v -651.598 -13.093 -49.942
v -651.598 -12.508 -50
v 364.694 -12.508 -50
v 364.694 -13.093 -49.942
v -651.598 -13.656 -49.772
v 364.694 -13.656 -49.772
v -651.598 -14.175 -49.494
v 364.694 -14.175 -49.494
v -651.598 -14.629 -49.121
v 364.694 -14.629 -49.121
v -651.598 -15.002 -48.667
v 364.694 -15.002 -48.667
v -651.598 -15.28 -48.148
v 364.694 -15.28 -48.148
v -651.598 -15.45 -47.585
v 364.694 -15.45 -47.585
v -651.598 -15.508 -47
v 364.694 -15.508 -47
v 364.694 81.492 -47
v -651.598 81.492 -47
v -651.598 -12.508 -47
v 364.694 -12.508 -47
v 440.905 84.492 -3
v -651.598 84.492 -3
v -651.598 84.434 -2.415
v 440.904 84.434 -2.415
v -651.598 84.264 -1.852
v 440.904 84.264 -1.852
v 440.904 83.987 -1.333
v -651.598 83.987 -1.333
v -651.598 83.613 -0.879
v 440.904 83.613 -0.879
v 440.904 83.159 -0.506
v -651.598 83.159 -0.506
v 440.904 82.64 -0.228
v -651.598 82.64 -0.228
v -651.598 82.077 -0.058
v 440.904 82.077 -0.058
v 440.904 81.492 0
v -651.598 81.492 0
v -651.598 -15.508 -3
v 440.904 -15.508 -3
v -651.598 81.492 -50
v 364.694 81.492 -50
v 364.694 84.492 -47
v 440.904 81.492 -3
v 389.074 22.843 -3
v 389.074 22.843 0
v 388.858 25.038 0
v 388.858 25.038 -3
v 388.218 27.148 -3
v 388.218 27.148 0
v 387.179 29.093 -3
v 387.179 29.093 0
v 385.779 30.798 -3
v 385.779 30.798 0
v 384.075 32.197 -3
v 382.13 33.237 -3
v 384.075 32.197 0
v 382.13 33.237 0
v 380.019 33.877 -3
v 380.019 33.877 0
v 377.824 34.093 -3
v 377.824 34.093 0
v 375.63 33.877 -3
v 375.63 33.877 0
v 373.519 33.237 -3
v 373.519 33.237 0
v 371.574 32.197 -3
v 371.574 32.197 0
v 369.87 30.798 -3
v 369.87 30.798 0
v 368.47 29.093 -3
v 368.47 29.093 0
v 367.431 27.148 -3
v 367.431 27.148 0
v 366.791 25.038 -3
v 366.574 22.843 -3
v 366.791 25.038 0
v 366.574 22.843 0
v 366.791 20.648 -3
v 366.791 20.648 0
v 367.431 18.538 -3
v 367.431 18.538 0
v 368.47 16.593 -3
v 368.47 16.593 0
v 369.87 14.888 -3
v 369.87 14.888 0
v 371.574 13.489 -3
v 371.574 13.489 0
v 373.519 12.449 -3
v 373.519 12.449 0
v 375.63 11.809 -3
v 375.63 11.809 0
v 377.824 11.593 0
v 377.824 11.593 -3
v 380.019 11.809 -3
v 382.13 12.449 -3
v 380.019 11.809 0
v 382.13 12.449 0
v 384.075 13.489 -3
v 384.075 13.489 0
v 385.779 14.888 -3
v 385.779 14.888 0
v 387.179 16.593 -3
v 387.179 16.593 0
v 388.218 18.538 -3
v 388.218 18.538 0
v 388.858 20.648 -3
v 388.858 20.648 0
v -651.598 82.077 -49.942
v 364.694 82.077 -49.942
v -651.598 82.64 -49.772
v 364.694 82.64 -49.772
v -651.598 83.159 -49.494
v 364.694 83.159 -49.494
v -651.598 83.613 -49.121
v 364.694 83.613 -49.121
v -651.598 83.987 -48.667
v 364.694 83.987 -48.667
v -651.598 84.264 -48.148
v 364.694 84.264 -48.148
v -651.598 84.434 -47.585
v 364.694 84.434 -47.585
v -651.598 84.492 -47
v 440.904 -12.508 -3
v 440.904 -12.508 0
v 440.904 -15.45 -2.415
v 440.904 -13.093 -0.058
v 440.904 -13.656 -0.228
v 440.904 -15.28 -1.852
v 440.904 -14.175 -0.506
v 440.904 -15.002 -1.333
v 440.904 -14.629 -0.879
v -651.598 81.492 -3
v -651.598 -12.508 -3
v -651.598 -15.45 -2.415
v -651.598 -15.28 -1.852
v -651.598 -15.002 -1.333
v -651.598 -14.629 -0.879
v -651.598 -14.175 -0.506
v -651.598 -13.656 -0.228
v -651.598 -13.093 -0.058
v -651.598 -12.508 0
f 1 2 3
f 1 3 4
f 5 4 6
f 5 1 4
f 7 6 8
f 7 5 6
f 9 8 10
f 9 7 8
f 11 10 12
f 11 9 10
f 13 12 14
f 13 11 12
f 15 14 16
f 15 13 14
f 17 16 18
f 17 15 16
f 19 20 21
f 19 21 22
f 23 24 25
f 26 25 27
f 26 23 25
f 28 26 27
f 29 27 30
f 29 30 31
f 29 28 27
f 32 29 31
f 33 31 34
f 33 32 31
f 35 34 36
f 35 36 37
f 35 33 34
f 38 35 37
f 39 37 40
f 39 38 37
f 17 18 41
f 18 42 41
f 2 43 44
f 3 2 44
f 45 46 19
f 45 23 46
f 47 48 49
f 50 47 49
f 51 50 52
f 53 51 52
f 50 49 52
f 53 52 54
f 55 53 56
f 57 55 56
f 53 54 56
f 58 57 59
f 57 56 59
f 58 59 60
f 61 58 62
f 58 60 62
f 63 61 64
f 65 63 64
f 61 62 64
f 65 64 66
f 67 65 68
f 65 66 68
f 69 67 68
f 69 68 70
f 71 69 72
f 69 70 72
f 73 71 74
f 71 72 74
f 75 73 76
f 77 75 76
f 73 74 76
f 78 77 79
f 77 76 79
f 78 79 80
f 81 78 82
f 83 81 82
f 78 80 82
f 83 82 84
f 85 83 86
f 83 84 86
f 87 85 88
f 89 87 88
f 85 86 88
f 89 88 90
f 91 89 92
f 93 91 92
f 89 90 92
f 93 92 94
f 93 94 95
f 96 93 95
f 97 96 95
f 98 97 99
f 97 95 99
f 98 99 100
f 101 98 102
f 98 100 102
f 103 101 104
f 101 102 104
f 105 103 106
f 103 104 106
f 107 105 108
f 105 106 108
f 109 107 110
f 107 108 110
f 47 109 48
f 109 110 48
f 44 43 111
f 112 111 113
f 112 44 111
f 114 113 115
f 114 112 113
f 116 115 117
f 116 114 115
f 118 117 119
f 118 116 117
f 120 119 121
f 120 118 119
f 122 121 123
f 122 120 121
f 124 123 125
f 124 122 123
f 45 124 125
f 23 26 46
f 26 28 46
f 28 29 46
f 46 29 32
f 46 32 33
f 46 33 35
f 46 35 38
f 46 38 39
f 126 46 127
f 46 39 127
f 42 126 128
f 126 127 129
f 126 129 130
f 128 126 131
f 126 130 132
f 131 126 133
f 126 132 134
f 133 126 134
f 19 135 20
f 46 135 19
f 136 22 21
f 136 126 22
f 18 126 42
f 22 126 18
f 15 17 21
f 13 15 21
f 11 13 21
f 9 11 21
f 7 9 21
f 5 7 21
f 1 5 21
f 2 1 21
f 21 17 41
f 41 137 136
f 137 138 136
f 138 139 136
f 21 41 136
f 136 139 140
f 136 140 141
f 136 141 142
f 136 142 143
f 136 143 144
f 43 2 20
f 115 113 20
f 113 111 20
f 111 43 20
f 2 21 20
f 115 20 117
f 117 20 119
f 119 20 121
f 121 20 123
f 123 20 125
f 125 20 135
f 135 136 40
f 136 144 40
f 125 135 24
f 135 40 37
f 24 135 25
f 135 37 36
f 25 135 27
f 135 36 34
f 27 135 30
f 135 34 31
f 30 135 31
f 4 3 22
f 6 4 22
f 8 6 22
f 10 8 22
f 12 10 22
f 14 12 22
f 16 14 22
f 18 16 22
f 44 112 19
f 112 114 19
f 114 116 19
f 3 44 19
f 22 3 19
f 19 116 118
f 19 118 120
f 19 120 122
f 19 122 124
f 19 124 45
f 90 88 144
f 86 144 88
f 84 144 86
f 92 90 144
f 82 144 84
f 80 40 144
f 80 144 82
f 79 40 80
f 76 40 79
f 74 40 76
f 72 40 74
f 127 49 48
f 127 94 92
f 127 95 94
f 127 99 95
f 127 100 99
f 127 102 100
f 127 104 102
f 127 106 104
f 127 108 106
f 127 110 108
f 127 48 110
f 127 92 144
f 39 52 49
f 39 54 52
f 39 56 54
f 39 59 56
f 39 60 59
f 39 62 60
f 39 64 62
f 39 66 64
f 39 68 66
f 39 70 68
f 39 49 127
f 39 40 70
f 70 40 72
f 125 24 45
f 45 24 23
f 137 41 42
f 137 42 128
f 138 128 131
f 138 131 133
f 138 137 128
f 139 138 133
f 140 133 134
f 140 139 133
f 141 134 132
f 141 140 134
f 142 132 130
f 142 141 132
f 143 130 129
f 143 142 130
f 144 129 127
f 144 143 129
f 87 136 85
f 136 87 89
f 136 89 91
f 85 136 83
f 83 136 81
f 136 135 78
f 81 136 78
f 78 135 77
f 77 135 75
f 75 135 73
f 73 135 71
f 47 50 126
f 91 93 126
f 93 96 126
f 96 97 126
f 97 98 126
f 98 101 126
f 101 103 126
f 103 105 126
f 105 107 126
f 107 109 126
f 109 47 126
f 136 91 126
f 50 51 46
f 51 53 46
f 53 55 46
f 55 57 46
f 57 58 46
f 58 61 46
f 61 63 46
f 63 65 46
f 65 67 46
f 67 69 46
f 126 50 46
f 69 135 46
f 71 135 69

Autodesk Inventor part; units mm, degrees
ref_plane "YZ Plane" through (0, 0, 0) normal (1, 0, 0) x (0, 1, 0)
ref_plane "XZ Plane" through (0, 0, 0) normal (0, 1, 0) x (-1, 0, 0)
ref_plane "XY Plane" through (0, 0, 0) normal (0, 0, 1) x (1, 0, 0)
sketch "Sketch1" plane through (0, 0, 0) normal (0, 0, 1) x (1, 0, 0)
  line L0 (-651.5983, 84.4921) -> (440.9045, 84.4921)
  line L1 (440.9045, 84.4921) -> (440.9045, -15.5079)
  line L2 (440.9045, -15.5079) -> (-651.5983, -15.5079)
  line L3 (-651.5983, -15.5079) -> (-651.5983, 84.4921)
  line L4 (-651.5983, -15.5079) -> (-899.2765, -81.873) projected
  point P0 (0, 0)
  dimension "d0" = 100
extrude "Extrusion1" add sketch "Sketch1" against normal blind 50
fillet "Fillet1" radius 3 4 edges at (-105.3469, 84.4921, 0) (-105.3469, 84.4921, -50) (-105.3469, -15.5079, 0) (-105.3469, -15.5079, -50)
shell "Shell1" thickness 3 removed faces 2 at (440.9045, 18.8255, -33.3333) at (-651.5983, 18.8255, -33.3333)
sketch "Sketch2" plane through (0, 0, 0) normal (0, 0, 1) x (1, 0, 0)
  circle A0 centre (377.8245, 22.8431) radius 11.25 projected
  point P0 (0, 0)
extrude "Extrusion2" cut sketch "Sketch2" against normal through all
sketch "Sketch3" plane through (-651.5983, 84.4921, -47) normal (0, 1, 0) x (1, 0, 0)
  line L0 (0, 0) -> (1092.5029, 0) projected
  line L1 (0, -44) -> (0, 0) projected
  line L2 (1092.5029, -44) -> (0, -44) projected
  line L3 (1092.5029, -44) -> (1092.5029, 0) projected
  line L4 (1092.5029, -44) -> (1016.2926, 0)
  line L5 (0, 0) -> (1092.5029, 0) projected
  line L6 (1092.5029, -44) -> (1101.6667, -44)
  line L7 (1101.6667, -44) -> (1101.6667, 18.4263)
  line L8 (1101.6667, 18.4263) -> (1016.2926, 18.4263)
  line L9 (1016.2926, 18.4263) -> (1016.2926, 0)
  point P0 (651.5983, -47)
  dimension "d8" = 30
extrude "Extrusion3" cut sketch "Sketch3" against normal through all contours L9 L8 L7 L6 L3 L0 | L0 L3 L4
properties part number "Barra nuevo pivote"
